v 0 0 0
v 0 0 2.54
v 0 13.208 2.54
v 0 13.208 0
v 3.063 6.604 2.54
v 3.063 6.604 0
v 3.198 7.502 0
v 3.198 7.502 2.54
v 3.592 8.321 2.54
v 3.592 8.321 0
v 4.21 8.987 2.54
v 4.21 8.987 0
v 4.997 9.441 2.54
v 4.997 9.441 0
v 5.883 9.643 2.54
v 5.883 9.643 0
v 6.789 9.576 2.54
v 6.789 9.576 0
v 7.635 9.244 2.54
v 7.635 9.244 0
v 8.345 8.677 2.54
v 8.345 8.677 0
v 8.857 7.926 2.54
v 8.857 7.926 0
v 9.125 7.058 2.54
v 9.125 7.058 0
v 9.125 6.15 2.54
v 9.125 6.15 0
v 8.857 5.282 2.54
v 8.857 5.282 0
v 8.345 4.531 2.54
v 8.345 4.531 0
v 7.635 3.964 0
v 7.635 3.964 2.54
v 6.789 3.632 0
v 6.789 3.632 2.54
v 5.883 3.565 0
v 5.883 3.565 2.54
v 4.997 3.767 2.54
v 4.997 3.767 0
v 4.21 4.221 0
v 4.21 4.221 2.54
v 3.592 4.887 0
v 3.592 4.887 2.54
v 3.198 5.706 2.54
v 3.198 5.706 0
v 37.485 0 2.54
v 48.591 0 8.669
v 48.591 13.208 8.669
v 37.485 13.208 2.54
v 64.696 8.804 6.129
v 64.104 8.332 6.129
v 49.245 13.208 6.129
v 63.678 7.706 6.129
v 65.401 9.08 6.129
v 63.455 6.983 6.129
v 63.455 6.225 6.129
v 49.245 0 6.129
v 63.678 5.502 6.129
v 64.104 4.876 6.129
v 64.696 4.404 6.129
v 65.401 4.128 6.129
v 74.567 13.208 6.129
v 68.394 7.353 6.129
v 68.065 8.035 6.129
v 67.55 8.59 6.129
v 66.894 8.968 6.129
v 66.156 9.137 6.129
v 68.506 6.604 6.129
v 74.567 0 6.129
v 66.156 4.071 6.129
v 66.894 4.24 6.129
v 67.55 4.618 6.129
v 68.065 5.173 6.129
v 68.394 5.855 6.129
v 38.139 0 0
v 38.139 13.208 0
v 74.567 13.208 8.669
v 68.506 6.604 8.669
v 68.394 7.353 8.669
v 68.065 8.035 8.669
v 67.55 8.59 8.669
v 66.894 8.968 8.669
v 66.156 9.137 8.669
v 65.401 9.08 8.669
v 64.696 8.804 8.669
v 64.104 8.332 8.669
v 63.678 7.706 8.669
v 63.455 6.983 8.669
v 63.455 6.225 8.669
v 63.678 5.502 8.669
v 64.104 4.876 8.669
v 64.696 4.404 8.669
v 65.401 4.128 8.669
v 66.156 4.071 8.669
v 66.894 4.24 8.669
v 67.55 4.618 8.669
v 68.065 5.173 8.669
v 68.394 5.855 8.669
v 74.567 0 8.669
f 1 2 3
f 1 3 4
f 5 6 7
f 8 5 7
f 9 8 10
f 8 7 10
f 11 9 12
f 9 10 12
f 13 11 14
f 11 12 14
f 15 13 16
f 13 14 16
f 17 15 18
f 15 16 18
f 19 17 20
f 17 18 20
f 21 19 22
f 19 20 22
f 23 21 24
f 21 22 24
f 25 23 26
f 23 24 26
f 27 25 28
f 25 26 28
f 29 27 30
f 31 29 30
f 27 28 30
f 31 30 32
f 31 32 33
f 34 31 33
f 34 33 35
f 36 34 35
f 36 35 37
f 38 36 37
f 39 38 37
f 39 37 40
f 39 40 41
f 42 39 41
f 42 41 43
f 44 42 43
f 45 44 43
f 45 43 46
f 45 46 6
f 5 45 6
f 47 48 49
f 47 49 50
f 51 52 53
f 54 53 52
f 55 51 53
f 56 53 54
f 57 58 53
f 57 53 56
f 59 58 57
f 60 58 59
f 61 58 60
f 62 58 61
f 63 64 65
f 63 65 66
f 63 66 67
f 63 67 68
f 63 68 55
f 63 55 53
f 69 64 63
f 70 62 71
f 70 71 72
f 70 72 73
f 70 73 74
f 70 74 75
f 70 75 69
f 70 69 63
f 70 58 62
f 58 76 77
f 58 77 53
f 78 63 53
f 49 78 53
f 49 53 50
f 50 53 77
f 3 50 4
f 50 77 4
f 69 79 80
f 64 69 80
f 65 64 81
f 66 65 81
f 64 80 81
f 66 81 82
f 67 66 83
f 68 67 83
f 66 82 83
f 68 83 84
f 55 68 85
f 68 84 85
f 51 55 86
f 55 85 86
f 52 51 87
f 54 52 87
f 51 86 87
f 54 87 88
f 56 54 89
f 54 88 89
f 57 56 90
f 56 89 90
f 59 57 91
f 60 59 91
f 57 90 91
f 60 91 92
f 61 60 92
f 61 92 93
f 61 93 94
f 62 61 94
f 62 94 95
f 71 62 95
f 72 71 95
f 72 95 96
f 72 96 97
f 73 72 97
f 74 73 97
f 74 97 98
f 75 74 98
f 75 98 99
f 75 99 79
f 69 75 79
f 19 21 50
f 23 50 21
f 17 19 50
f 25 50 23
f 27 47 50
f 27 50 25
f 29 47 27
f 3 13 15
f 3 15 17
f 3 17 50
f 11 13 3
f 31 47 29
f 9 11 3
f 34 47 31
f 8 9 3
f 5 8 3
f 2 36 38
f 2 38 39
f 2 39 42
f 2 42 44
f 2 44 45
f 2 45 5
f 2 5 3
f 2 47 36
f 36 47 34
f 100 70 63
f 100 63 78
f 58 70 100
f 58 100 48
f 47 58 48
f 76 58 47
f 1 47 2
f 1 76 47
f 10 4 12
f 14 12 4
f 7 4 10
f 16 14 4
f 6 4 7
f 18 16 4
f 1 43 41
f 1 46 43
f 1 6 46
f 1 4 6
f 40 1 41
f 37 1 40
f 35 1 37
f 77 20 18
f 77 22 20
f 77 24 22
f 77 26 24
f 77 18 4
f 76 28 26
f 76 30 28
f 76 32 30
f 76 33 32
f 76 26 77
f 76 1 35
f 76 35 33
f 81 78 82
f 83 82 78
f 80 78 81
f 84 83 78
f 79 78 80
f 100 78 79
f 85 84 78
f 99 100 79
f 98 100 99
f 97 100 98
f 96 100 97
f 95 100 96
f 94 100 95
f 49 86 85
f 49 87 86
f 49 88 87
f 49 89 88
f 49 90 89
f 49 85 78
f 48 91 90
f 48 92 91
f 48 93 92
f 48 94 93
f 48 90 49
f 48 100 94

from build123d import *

# Parameters (mm, degrees)
EXTRUDE_THIN1_DEPTH = 13.208
CUT_EXTRUDE1_REACH  = 10.669
SKETCH3_R           = 3.048
CUT_EXTRUDE2_REACH  = 10.669
SKETCH4_R           = 2.54


with BuildPart() as part:
    # Sketch1 → Extrude-Thin1 (new body)
    with BuildSketch(Plane(origin=(0, 0, 0), x_dir=(1, 0, 0), z_dir=(0, 1, 0))):
        Polygon((0, 0), (38.139058105, 0), (49.245270394, -6.128868698), (74.567434413, -6.128868698), (74.567434413, -8.668868698), (48.590941352, -8.668868698), (37.484729063, -2.54), (0, -2.54), align=None)
    extrude(amount=EXTRUDE_THIN1_DEPTH)

    # Sketch3 → Cut-Extrude1 (cut, up to next)
    with BuildSketch(Plane(origin=(0, 0, 0), x_dir=(-1, 0, 0), z_dir=(0, 0, -1)), mode=Mode.PRIVATE) as cut_extrude1_sk1:
        with Locations((-6.110625798, 6.604)):
            Circle(SKETCH3_R)
    cut_extrude1_tool1 = extrude(cut_extrude1_sk1.sketch, amount=-CUT_EXTRUDE1_REACH, mode=Mode.PRIVATE) & part.part
    add(cut_extrude1_tool1.solids().sort_by_distance((6.110626, 6.604, 0))[0], mode=Mode.SUBTRACT)

    # Sketch4 → Cut-Extrude2 (cut, up to next)
    with BuildSketch(Plane.XY.offset(8.668868698), mode=Mode.PRIVATE) as cut_extrude2_sk1:
        with Locations((65.966386127, 6.604)):
            Circle(SKETCH4_R)
    cut_extrude2_tool1 = extrude(cut_extrude2_sk1.sketch, amount=-CUT_EXTRUDE2_REACH, mode=Mode.PRIVATE) & part.part
    add(cut_extrude2_tool1.solids().sort_by_distance((65.966386, 6.604, 8.668869))[0], mode=Mode.SUBTRACT)


solid = part.part
